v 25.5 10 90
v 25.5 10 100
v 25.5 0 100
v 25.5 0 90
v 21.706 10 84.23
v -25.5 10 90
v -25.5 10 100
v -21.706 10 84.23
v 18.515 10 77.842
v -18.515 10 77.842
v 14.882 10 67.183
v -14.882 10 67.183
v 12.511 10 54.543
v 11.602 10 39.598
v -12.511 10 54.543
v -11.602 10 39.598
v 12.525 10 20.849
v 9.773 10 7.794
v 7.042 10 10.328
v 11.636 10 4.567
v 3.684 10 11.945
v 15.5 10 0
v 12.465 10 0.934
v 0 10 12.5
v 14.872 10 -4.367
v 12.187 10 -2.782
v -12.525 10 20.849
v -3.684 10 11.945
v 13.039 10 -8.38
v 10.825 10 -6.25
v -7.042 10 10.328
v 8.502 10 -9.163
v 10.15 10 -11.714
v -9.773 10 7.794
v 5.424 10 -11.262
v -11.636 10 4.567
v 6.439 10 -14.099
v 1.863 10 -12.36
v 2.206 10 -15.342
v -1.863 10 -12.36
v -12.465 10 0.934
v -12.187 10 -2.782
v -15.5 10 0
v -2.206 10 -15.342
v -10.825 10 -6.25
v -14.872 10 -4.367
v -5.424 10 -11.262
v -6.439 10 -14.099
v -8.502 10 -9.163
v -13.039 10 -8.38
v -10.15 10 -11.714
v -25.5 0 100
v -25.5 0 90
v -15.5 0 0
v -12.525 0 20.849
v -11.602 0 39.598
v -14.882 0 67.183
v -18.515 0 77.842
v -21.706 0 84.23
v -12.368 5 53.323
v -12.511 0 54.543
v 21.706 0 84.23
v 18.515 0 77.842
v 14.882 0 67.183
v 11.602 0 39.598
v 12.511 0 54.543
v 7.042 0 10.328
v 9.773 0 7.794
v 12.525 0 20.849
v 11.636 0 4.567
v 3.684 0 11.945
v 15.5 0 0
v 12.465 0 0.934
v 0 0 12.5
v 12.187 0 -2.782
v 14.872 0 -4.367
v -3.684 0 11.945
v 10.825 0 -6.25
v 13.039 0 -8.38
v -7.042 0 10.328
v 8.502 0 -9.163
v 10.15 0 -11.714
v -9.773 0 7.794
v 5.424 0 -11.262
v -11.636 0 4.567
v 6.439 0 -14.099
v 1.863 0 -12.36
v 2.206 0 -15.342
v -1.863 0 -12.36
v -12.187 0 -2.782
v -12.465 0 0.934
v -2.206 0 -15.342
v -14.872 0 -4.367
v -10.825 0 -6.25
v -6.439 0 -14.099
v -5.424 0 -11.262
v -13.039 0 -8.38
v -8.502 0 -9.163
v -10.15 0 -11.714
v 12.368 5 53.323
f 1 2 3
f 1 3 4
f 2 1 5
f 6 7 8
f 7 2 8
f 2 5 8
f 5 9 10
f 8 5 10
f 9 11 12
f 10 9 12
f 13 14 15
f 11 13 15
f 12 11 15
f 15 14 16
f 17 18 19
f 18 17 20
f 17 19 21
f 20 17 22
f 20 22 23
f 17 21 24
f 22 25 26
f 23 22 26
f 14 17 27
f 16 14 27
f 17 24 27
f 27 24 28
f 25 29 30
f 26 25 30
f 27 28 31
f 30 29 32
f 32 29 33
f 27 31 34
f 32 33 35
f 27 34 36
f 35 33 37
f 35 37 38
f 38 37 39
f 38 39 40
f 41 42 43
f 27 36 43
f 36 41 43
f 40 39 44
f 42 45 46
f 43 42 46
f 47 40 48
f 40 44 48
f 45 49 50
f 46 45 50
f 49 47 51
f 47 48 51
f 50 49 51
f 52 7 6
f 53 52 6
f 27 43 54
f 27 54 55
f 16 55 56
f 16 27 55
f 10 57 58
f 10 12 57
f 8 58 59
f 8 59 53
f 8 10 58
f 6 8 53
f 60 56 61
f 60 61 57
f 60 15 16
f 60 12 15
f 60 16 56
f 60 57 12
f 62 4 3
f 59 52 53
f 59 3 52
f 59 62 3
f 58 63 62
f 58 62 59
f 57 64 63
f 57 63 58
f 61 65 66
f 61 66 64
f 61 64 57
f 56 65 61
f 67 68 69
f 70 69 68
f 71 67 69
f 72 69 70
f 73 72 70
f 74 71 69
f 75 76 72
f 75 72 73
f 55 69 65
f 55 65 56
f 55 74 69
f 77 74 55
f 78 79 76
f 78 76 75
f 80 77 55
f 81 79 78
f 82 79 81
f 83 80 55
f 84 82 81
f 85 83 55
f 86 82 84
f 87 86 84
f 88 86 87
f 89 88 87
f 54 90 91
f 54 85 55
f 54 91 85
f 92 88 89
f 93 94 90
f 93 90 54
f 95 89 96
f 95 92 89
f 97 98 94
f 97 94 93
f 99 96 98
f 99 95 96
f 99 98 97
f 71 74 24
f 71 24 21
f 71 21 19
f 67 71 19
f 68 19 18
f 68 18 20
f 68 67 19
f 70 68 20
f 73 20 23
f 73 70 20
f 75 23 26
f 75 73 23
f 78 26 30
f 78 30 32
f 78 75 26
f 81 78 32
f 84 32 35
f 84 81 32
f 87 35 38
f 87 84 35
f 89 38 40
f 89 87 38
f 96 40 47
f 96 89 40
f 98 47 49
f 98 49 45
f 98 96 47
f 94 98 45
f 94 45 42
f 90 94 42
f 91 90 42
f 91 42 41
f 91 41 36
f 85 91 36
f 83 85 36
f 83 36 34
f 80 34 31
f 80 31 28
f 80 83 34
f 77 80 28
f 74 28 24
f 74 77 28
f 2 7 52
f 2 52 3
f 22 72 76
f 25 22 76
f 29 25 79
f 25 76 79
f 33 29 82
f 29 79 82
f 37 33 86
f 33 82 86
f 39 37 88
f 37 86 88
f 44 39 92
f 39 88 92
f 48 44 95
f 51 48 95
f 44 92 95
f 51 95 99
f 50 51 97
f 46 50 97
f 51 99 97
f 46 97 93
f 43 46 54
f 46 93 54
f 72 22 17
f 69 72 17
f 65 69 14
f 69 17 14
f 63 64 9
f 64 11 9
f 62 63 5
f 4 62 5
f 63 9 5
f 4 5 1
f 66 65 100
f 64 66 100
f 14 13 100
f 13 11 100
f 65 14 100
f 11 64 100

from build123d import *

# Parameters (mm, degrees)
SKETCH_1_R          = 12.5
EXTRUDE_1_DEPTH     = 10
SKETCH_2_W          = 51
SKETCH_2_H          = 10
EXTRUDE_2_DEPTH     = 10
EXTRUDE_3_DEPTH     = 10
CUT_EXTRUDE_2_DEPTH = 10


with BuildPart() as part:
    # Эскиз1 → Бобышка-Вытянуть1 (new body)
    with BuildSketch(Plane(origin=(0, 0, 0), x_dir=(1, 0, 0), z_dir=(0, 1, 0))):
        with BuildLine():
            Line((-15.5, 0), (-15.5, -100))
            Line((-15.5, -100), (15.5, -100))
            Line((15.5, -100), (15.5, 0))
            ThreePointArc((15.5, 0), (0, 15.5), (-15.5, 0))
        make_face()
        with Locations(Location((0, 0, 0), (0, 0, 270))):
            Circle(SKETCH_1_R, mode=Mode.SUBTRACT)
    extrude(amount=EXTRUDE_1_DEPTH)

    # Эскиз2 → Бобышка-Вытянуть2 (add, through all)
    with BuildSketch(Plane(origin=(0, 10, 0), x_dir=(1, 0, 0), z_dir=(0, 1, 0))):
        with Locations((0, -95)):
            Rectangle(SKETCH_2_W, SKETCH_2_H)
    extrude(amount=-EXTRUDE_2_DEPTH)

    # Эскиз4 → Бобышка-Вытянуть3 (add)
    with BuildSketch(Plane(origin=(0, 10, 0), x_dir=(1, 0, 0), z_dir=(0, 1, 0))):
        Polygon((-25.5, -90), (-15.5, 0), (-15.5, -90), align=None)
        Polygon((15.5, -90), (25.5, -90), (15.5, 0), align=None)
    extrude(amount=-EXTRUDE_3_DEPTH)

    # Эскиз3 → Вырез-Вытянуть2 (cut)
    with BuildSketch(Plane(origin=(0, 10, 0), x_dir=(1, 0, 0), z_dir=(0, 1, 0))):
        with BuildLine():
            Line((-15.5, 0), (-25.5, -90))
            add(Edge.make_bspline(
                [(-15.5, 0), (-4.236810468, -61.646447202), (-25.5, -90)],
                knots=[0, 0, 0, 1, 1, 1], degree=2))
        make_face()
        with BuildLine():
            Line((15.5, 0), (25.5, -90))
            add(Edge.make_bspline(
                [(15.5, 0), (4.236810468, -61.646447202), (25.5, -90)],
                knots=[0, 0, 0, 1, 1, 1], degree=2))
        make_face()
    extrude(amount=-CUT_EXTRUDE_2_DEPTH, mode=Mode.SUBTRACT)


solid = part.part
